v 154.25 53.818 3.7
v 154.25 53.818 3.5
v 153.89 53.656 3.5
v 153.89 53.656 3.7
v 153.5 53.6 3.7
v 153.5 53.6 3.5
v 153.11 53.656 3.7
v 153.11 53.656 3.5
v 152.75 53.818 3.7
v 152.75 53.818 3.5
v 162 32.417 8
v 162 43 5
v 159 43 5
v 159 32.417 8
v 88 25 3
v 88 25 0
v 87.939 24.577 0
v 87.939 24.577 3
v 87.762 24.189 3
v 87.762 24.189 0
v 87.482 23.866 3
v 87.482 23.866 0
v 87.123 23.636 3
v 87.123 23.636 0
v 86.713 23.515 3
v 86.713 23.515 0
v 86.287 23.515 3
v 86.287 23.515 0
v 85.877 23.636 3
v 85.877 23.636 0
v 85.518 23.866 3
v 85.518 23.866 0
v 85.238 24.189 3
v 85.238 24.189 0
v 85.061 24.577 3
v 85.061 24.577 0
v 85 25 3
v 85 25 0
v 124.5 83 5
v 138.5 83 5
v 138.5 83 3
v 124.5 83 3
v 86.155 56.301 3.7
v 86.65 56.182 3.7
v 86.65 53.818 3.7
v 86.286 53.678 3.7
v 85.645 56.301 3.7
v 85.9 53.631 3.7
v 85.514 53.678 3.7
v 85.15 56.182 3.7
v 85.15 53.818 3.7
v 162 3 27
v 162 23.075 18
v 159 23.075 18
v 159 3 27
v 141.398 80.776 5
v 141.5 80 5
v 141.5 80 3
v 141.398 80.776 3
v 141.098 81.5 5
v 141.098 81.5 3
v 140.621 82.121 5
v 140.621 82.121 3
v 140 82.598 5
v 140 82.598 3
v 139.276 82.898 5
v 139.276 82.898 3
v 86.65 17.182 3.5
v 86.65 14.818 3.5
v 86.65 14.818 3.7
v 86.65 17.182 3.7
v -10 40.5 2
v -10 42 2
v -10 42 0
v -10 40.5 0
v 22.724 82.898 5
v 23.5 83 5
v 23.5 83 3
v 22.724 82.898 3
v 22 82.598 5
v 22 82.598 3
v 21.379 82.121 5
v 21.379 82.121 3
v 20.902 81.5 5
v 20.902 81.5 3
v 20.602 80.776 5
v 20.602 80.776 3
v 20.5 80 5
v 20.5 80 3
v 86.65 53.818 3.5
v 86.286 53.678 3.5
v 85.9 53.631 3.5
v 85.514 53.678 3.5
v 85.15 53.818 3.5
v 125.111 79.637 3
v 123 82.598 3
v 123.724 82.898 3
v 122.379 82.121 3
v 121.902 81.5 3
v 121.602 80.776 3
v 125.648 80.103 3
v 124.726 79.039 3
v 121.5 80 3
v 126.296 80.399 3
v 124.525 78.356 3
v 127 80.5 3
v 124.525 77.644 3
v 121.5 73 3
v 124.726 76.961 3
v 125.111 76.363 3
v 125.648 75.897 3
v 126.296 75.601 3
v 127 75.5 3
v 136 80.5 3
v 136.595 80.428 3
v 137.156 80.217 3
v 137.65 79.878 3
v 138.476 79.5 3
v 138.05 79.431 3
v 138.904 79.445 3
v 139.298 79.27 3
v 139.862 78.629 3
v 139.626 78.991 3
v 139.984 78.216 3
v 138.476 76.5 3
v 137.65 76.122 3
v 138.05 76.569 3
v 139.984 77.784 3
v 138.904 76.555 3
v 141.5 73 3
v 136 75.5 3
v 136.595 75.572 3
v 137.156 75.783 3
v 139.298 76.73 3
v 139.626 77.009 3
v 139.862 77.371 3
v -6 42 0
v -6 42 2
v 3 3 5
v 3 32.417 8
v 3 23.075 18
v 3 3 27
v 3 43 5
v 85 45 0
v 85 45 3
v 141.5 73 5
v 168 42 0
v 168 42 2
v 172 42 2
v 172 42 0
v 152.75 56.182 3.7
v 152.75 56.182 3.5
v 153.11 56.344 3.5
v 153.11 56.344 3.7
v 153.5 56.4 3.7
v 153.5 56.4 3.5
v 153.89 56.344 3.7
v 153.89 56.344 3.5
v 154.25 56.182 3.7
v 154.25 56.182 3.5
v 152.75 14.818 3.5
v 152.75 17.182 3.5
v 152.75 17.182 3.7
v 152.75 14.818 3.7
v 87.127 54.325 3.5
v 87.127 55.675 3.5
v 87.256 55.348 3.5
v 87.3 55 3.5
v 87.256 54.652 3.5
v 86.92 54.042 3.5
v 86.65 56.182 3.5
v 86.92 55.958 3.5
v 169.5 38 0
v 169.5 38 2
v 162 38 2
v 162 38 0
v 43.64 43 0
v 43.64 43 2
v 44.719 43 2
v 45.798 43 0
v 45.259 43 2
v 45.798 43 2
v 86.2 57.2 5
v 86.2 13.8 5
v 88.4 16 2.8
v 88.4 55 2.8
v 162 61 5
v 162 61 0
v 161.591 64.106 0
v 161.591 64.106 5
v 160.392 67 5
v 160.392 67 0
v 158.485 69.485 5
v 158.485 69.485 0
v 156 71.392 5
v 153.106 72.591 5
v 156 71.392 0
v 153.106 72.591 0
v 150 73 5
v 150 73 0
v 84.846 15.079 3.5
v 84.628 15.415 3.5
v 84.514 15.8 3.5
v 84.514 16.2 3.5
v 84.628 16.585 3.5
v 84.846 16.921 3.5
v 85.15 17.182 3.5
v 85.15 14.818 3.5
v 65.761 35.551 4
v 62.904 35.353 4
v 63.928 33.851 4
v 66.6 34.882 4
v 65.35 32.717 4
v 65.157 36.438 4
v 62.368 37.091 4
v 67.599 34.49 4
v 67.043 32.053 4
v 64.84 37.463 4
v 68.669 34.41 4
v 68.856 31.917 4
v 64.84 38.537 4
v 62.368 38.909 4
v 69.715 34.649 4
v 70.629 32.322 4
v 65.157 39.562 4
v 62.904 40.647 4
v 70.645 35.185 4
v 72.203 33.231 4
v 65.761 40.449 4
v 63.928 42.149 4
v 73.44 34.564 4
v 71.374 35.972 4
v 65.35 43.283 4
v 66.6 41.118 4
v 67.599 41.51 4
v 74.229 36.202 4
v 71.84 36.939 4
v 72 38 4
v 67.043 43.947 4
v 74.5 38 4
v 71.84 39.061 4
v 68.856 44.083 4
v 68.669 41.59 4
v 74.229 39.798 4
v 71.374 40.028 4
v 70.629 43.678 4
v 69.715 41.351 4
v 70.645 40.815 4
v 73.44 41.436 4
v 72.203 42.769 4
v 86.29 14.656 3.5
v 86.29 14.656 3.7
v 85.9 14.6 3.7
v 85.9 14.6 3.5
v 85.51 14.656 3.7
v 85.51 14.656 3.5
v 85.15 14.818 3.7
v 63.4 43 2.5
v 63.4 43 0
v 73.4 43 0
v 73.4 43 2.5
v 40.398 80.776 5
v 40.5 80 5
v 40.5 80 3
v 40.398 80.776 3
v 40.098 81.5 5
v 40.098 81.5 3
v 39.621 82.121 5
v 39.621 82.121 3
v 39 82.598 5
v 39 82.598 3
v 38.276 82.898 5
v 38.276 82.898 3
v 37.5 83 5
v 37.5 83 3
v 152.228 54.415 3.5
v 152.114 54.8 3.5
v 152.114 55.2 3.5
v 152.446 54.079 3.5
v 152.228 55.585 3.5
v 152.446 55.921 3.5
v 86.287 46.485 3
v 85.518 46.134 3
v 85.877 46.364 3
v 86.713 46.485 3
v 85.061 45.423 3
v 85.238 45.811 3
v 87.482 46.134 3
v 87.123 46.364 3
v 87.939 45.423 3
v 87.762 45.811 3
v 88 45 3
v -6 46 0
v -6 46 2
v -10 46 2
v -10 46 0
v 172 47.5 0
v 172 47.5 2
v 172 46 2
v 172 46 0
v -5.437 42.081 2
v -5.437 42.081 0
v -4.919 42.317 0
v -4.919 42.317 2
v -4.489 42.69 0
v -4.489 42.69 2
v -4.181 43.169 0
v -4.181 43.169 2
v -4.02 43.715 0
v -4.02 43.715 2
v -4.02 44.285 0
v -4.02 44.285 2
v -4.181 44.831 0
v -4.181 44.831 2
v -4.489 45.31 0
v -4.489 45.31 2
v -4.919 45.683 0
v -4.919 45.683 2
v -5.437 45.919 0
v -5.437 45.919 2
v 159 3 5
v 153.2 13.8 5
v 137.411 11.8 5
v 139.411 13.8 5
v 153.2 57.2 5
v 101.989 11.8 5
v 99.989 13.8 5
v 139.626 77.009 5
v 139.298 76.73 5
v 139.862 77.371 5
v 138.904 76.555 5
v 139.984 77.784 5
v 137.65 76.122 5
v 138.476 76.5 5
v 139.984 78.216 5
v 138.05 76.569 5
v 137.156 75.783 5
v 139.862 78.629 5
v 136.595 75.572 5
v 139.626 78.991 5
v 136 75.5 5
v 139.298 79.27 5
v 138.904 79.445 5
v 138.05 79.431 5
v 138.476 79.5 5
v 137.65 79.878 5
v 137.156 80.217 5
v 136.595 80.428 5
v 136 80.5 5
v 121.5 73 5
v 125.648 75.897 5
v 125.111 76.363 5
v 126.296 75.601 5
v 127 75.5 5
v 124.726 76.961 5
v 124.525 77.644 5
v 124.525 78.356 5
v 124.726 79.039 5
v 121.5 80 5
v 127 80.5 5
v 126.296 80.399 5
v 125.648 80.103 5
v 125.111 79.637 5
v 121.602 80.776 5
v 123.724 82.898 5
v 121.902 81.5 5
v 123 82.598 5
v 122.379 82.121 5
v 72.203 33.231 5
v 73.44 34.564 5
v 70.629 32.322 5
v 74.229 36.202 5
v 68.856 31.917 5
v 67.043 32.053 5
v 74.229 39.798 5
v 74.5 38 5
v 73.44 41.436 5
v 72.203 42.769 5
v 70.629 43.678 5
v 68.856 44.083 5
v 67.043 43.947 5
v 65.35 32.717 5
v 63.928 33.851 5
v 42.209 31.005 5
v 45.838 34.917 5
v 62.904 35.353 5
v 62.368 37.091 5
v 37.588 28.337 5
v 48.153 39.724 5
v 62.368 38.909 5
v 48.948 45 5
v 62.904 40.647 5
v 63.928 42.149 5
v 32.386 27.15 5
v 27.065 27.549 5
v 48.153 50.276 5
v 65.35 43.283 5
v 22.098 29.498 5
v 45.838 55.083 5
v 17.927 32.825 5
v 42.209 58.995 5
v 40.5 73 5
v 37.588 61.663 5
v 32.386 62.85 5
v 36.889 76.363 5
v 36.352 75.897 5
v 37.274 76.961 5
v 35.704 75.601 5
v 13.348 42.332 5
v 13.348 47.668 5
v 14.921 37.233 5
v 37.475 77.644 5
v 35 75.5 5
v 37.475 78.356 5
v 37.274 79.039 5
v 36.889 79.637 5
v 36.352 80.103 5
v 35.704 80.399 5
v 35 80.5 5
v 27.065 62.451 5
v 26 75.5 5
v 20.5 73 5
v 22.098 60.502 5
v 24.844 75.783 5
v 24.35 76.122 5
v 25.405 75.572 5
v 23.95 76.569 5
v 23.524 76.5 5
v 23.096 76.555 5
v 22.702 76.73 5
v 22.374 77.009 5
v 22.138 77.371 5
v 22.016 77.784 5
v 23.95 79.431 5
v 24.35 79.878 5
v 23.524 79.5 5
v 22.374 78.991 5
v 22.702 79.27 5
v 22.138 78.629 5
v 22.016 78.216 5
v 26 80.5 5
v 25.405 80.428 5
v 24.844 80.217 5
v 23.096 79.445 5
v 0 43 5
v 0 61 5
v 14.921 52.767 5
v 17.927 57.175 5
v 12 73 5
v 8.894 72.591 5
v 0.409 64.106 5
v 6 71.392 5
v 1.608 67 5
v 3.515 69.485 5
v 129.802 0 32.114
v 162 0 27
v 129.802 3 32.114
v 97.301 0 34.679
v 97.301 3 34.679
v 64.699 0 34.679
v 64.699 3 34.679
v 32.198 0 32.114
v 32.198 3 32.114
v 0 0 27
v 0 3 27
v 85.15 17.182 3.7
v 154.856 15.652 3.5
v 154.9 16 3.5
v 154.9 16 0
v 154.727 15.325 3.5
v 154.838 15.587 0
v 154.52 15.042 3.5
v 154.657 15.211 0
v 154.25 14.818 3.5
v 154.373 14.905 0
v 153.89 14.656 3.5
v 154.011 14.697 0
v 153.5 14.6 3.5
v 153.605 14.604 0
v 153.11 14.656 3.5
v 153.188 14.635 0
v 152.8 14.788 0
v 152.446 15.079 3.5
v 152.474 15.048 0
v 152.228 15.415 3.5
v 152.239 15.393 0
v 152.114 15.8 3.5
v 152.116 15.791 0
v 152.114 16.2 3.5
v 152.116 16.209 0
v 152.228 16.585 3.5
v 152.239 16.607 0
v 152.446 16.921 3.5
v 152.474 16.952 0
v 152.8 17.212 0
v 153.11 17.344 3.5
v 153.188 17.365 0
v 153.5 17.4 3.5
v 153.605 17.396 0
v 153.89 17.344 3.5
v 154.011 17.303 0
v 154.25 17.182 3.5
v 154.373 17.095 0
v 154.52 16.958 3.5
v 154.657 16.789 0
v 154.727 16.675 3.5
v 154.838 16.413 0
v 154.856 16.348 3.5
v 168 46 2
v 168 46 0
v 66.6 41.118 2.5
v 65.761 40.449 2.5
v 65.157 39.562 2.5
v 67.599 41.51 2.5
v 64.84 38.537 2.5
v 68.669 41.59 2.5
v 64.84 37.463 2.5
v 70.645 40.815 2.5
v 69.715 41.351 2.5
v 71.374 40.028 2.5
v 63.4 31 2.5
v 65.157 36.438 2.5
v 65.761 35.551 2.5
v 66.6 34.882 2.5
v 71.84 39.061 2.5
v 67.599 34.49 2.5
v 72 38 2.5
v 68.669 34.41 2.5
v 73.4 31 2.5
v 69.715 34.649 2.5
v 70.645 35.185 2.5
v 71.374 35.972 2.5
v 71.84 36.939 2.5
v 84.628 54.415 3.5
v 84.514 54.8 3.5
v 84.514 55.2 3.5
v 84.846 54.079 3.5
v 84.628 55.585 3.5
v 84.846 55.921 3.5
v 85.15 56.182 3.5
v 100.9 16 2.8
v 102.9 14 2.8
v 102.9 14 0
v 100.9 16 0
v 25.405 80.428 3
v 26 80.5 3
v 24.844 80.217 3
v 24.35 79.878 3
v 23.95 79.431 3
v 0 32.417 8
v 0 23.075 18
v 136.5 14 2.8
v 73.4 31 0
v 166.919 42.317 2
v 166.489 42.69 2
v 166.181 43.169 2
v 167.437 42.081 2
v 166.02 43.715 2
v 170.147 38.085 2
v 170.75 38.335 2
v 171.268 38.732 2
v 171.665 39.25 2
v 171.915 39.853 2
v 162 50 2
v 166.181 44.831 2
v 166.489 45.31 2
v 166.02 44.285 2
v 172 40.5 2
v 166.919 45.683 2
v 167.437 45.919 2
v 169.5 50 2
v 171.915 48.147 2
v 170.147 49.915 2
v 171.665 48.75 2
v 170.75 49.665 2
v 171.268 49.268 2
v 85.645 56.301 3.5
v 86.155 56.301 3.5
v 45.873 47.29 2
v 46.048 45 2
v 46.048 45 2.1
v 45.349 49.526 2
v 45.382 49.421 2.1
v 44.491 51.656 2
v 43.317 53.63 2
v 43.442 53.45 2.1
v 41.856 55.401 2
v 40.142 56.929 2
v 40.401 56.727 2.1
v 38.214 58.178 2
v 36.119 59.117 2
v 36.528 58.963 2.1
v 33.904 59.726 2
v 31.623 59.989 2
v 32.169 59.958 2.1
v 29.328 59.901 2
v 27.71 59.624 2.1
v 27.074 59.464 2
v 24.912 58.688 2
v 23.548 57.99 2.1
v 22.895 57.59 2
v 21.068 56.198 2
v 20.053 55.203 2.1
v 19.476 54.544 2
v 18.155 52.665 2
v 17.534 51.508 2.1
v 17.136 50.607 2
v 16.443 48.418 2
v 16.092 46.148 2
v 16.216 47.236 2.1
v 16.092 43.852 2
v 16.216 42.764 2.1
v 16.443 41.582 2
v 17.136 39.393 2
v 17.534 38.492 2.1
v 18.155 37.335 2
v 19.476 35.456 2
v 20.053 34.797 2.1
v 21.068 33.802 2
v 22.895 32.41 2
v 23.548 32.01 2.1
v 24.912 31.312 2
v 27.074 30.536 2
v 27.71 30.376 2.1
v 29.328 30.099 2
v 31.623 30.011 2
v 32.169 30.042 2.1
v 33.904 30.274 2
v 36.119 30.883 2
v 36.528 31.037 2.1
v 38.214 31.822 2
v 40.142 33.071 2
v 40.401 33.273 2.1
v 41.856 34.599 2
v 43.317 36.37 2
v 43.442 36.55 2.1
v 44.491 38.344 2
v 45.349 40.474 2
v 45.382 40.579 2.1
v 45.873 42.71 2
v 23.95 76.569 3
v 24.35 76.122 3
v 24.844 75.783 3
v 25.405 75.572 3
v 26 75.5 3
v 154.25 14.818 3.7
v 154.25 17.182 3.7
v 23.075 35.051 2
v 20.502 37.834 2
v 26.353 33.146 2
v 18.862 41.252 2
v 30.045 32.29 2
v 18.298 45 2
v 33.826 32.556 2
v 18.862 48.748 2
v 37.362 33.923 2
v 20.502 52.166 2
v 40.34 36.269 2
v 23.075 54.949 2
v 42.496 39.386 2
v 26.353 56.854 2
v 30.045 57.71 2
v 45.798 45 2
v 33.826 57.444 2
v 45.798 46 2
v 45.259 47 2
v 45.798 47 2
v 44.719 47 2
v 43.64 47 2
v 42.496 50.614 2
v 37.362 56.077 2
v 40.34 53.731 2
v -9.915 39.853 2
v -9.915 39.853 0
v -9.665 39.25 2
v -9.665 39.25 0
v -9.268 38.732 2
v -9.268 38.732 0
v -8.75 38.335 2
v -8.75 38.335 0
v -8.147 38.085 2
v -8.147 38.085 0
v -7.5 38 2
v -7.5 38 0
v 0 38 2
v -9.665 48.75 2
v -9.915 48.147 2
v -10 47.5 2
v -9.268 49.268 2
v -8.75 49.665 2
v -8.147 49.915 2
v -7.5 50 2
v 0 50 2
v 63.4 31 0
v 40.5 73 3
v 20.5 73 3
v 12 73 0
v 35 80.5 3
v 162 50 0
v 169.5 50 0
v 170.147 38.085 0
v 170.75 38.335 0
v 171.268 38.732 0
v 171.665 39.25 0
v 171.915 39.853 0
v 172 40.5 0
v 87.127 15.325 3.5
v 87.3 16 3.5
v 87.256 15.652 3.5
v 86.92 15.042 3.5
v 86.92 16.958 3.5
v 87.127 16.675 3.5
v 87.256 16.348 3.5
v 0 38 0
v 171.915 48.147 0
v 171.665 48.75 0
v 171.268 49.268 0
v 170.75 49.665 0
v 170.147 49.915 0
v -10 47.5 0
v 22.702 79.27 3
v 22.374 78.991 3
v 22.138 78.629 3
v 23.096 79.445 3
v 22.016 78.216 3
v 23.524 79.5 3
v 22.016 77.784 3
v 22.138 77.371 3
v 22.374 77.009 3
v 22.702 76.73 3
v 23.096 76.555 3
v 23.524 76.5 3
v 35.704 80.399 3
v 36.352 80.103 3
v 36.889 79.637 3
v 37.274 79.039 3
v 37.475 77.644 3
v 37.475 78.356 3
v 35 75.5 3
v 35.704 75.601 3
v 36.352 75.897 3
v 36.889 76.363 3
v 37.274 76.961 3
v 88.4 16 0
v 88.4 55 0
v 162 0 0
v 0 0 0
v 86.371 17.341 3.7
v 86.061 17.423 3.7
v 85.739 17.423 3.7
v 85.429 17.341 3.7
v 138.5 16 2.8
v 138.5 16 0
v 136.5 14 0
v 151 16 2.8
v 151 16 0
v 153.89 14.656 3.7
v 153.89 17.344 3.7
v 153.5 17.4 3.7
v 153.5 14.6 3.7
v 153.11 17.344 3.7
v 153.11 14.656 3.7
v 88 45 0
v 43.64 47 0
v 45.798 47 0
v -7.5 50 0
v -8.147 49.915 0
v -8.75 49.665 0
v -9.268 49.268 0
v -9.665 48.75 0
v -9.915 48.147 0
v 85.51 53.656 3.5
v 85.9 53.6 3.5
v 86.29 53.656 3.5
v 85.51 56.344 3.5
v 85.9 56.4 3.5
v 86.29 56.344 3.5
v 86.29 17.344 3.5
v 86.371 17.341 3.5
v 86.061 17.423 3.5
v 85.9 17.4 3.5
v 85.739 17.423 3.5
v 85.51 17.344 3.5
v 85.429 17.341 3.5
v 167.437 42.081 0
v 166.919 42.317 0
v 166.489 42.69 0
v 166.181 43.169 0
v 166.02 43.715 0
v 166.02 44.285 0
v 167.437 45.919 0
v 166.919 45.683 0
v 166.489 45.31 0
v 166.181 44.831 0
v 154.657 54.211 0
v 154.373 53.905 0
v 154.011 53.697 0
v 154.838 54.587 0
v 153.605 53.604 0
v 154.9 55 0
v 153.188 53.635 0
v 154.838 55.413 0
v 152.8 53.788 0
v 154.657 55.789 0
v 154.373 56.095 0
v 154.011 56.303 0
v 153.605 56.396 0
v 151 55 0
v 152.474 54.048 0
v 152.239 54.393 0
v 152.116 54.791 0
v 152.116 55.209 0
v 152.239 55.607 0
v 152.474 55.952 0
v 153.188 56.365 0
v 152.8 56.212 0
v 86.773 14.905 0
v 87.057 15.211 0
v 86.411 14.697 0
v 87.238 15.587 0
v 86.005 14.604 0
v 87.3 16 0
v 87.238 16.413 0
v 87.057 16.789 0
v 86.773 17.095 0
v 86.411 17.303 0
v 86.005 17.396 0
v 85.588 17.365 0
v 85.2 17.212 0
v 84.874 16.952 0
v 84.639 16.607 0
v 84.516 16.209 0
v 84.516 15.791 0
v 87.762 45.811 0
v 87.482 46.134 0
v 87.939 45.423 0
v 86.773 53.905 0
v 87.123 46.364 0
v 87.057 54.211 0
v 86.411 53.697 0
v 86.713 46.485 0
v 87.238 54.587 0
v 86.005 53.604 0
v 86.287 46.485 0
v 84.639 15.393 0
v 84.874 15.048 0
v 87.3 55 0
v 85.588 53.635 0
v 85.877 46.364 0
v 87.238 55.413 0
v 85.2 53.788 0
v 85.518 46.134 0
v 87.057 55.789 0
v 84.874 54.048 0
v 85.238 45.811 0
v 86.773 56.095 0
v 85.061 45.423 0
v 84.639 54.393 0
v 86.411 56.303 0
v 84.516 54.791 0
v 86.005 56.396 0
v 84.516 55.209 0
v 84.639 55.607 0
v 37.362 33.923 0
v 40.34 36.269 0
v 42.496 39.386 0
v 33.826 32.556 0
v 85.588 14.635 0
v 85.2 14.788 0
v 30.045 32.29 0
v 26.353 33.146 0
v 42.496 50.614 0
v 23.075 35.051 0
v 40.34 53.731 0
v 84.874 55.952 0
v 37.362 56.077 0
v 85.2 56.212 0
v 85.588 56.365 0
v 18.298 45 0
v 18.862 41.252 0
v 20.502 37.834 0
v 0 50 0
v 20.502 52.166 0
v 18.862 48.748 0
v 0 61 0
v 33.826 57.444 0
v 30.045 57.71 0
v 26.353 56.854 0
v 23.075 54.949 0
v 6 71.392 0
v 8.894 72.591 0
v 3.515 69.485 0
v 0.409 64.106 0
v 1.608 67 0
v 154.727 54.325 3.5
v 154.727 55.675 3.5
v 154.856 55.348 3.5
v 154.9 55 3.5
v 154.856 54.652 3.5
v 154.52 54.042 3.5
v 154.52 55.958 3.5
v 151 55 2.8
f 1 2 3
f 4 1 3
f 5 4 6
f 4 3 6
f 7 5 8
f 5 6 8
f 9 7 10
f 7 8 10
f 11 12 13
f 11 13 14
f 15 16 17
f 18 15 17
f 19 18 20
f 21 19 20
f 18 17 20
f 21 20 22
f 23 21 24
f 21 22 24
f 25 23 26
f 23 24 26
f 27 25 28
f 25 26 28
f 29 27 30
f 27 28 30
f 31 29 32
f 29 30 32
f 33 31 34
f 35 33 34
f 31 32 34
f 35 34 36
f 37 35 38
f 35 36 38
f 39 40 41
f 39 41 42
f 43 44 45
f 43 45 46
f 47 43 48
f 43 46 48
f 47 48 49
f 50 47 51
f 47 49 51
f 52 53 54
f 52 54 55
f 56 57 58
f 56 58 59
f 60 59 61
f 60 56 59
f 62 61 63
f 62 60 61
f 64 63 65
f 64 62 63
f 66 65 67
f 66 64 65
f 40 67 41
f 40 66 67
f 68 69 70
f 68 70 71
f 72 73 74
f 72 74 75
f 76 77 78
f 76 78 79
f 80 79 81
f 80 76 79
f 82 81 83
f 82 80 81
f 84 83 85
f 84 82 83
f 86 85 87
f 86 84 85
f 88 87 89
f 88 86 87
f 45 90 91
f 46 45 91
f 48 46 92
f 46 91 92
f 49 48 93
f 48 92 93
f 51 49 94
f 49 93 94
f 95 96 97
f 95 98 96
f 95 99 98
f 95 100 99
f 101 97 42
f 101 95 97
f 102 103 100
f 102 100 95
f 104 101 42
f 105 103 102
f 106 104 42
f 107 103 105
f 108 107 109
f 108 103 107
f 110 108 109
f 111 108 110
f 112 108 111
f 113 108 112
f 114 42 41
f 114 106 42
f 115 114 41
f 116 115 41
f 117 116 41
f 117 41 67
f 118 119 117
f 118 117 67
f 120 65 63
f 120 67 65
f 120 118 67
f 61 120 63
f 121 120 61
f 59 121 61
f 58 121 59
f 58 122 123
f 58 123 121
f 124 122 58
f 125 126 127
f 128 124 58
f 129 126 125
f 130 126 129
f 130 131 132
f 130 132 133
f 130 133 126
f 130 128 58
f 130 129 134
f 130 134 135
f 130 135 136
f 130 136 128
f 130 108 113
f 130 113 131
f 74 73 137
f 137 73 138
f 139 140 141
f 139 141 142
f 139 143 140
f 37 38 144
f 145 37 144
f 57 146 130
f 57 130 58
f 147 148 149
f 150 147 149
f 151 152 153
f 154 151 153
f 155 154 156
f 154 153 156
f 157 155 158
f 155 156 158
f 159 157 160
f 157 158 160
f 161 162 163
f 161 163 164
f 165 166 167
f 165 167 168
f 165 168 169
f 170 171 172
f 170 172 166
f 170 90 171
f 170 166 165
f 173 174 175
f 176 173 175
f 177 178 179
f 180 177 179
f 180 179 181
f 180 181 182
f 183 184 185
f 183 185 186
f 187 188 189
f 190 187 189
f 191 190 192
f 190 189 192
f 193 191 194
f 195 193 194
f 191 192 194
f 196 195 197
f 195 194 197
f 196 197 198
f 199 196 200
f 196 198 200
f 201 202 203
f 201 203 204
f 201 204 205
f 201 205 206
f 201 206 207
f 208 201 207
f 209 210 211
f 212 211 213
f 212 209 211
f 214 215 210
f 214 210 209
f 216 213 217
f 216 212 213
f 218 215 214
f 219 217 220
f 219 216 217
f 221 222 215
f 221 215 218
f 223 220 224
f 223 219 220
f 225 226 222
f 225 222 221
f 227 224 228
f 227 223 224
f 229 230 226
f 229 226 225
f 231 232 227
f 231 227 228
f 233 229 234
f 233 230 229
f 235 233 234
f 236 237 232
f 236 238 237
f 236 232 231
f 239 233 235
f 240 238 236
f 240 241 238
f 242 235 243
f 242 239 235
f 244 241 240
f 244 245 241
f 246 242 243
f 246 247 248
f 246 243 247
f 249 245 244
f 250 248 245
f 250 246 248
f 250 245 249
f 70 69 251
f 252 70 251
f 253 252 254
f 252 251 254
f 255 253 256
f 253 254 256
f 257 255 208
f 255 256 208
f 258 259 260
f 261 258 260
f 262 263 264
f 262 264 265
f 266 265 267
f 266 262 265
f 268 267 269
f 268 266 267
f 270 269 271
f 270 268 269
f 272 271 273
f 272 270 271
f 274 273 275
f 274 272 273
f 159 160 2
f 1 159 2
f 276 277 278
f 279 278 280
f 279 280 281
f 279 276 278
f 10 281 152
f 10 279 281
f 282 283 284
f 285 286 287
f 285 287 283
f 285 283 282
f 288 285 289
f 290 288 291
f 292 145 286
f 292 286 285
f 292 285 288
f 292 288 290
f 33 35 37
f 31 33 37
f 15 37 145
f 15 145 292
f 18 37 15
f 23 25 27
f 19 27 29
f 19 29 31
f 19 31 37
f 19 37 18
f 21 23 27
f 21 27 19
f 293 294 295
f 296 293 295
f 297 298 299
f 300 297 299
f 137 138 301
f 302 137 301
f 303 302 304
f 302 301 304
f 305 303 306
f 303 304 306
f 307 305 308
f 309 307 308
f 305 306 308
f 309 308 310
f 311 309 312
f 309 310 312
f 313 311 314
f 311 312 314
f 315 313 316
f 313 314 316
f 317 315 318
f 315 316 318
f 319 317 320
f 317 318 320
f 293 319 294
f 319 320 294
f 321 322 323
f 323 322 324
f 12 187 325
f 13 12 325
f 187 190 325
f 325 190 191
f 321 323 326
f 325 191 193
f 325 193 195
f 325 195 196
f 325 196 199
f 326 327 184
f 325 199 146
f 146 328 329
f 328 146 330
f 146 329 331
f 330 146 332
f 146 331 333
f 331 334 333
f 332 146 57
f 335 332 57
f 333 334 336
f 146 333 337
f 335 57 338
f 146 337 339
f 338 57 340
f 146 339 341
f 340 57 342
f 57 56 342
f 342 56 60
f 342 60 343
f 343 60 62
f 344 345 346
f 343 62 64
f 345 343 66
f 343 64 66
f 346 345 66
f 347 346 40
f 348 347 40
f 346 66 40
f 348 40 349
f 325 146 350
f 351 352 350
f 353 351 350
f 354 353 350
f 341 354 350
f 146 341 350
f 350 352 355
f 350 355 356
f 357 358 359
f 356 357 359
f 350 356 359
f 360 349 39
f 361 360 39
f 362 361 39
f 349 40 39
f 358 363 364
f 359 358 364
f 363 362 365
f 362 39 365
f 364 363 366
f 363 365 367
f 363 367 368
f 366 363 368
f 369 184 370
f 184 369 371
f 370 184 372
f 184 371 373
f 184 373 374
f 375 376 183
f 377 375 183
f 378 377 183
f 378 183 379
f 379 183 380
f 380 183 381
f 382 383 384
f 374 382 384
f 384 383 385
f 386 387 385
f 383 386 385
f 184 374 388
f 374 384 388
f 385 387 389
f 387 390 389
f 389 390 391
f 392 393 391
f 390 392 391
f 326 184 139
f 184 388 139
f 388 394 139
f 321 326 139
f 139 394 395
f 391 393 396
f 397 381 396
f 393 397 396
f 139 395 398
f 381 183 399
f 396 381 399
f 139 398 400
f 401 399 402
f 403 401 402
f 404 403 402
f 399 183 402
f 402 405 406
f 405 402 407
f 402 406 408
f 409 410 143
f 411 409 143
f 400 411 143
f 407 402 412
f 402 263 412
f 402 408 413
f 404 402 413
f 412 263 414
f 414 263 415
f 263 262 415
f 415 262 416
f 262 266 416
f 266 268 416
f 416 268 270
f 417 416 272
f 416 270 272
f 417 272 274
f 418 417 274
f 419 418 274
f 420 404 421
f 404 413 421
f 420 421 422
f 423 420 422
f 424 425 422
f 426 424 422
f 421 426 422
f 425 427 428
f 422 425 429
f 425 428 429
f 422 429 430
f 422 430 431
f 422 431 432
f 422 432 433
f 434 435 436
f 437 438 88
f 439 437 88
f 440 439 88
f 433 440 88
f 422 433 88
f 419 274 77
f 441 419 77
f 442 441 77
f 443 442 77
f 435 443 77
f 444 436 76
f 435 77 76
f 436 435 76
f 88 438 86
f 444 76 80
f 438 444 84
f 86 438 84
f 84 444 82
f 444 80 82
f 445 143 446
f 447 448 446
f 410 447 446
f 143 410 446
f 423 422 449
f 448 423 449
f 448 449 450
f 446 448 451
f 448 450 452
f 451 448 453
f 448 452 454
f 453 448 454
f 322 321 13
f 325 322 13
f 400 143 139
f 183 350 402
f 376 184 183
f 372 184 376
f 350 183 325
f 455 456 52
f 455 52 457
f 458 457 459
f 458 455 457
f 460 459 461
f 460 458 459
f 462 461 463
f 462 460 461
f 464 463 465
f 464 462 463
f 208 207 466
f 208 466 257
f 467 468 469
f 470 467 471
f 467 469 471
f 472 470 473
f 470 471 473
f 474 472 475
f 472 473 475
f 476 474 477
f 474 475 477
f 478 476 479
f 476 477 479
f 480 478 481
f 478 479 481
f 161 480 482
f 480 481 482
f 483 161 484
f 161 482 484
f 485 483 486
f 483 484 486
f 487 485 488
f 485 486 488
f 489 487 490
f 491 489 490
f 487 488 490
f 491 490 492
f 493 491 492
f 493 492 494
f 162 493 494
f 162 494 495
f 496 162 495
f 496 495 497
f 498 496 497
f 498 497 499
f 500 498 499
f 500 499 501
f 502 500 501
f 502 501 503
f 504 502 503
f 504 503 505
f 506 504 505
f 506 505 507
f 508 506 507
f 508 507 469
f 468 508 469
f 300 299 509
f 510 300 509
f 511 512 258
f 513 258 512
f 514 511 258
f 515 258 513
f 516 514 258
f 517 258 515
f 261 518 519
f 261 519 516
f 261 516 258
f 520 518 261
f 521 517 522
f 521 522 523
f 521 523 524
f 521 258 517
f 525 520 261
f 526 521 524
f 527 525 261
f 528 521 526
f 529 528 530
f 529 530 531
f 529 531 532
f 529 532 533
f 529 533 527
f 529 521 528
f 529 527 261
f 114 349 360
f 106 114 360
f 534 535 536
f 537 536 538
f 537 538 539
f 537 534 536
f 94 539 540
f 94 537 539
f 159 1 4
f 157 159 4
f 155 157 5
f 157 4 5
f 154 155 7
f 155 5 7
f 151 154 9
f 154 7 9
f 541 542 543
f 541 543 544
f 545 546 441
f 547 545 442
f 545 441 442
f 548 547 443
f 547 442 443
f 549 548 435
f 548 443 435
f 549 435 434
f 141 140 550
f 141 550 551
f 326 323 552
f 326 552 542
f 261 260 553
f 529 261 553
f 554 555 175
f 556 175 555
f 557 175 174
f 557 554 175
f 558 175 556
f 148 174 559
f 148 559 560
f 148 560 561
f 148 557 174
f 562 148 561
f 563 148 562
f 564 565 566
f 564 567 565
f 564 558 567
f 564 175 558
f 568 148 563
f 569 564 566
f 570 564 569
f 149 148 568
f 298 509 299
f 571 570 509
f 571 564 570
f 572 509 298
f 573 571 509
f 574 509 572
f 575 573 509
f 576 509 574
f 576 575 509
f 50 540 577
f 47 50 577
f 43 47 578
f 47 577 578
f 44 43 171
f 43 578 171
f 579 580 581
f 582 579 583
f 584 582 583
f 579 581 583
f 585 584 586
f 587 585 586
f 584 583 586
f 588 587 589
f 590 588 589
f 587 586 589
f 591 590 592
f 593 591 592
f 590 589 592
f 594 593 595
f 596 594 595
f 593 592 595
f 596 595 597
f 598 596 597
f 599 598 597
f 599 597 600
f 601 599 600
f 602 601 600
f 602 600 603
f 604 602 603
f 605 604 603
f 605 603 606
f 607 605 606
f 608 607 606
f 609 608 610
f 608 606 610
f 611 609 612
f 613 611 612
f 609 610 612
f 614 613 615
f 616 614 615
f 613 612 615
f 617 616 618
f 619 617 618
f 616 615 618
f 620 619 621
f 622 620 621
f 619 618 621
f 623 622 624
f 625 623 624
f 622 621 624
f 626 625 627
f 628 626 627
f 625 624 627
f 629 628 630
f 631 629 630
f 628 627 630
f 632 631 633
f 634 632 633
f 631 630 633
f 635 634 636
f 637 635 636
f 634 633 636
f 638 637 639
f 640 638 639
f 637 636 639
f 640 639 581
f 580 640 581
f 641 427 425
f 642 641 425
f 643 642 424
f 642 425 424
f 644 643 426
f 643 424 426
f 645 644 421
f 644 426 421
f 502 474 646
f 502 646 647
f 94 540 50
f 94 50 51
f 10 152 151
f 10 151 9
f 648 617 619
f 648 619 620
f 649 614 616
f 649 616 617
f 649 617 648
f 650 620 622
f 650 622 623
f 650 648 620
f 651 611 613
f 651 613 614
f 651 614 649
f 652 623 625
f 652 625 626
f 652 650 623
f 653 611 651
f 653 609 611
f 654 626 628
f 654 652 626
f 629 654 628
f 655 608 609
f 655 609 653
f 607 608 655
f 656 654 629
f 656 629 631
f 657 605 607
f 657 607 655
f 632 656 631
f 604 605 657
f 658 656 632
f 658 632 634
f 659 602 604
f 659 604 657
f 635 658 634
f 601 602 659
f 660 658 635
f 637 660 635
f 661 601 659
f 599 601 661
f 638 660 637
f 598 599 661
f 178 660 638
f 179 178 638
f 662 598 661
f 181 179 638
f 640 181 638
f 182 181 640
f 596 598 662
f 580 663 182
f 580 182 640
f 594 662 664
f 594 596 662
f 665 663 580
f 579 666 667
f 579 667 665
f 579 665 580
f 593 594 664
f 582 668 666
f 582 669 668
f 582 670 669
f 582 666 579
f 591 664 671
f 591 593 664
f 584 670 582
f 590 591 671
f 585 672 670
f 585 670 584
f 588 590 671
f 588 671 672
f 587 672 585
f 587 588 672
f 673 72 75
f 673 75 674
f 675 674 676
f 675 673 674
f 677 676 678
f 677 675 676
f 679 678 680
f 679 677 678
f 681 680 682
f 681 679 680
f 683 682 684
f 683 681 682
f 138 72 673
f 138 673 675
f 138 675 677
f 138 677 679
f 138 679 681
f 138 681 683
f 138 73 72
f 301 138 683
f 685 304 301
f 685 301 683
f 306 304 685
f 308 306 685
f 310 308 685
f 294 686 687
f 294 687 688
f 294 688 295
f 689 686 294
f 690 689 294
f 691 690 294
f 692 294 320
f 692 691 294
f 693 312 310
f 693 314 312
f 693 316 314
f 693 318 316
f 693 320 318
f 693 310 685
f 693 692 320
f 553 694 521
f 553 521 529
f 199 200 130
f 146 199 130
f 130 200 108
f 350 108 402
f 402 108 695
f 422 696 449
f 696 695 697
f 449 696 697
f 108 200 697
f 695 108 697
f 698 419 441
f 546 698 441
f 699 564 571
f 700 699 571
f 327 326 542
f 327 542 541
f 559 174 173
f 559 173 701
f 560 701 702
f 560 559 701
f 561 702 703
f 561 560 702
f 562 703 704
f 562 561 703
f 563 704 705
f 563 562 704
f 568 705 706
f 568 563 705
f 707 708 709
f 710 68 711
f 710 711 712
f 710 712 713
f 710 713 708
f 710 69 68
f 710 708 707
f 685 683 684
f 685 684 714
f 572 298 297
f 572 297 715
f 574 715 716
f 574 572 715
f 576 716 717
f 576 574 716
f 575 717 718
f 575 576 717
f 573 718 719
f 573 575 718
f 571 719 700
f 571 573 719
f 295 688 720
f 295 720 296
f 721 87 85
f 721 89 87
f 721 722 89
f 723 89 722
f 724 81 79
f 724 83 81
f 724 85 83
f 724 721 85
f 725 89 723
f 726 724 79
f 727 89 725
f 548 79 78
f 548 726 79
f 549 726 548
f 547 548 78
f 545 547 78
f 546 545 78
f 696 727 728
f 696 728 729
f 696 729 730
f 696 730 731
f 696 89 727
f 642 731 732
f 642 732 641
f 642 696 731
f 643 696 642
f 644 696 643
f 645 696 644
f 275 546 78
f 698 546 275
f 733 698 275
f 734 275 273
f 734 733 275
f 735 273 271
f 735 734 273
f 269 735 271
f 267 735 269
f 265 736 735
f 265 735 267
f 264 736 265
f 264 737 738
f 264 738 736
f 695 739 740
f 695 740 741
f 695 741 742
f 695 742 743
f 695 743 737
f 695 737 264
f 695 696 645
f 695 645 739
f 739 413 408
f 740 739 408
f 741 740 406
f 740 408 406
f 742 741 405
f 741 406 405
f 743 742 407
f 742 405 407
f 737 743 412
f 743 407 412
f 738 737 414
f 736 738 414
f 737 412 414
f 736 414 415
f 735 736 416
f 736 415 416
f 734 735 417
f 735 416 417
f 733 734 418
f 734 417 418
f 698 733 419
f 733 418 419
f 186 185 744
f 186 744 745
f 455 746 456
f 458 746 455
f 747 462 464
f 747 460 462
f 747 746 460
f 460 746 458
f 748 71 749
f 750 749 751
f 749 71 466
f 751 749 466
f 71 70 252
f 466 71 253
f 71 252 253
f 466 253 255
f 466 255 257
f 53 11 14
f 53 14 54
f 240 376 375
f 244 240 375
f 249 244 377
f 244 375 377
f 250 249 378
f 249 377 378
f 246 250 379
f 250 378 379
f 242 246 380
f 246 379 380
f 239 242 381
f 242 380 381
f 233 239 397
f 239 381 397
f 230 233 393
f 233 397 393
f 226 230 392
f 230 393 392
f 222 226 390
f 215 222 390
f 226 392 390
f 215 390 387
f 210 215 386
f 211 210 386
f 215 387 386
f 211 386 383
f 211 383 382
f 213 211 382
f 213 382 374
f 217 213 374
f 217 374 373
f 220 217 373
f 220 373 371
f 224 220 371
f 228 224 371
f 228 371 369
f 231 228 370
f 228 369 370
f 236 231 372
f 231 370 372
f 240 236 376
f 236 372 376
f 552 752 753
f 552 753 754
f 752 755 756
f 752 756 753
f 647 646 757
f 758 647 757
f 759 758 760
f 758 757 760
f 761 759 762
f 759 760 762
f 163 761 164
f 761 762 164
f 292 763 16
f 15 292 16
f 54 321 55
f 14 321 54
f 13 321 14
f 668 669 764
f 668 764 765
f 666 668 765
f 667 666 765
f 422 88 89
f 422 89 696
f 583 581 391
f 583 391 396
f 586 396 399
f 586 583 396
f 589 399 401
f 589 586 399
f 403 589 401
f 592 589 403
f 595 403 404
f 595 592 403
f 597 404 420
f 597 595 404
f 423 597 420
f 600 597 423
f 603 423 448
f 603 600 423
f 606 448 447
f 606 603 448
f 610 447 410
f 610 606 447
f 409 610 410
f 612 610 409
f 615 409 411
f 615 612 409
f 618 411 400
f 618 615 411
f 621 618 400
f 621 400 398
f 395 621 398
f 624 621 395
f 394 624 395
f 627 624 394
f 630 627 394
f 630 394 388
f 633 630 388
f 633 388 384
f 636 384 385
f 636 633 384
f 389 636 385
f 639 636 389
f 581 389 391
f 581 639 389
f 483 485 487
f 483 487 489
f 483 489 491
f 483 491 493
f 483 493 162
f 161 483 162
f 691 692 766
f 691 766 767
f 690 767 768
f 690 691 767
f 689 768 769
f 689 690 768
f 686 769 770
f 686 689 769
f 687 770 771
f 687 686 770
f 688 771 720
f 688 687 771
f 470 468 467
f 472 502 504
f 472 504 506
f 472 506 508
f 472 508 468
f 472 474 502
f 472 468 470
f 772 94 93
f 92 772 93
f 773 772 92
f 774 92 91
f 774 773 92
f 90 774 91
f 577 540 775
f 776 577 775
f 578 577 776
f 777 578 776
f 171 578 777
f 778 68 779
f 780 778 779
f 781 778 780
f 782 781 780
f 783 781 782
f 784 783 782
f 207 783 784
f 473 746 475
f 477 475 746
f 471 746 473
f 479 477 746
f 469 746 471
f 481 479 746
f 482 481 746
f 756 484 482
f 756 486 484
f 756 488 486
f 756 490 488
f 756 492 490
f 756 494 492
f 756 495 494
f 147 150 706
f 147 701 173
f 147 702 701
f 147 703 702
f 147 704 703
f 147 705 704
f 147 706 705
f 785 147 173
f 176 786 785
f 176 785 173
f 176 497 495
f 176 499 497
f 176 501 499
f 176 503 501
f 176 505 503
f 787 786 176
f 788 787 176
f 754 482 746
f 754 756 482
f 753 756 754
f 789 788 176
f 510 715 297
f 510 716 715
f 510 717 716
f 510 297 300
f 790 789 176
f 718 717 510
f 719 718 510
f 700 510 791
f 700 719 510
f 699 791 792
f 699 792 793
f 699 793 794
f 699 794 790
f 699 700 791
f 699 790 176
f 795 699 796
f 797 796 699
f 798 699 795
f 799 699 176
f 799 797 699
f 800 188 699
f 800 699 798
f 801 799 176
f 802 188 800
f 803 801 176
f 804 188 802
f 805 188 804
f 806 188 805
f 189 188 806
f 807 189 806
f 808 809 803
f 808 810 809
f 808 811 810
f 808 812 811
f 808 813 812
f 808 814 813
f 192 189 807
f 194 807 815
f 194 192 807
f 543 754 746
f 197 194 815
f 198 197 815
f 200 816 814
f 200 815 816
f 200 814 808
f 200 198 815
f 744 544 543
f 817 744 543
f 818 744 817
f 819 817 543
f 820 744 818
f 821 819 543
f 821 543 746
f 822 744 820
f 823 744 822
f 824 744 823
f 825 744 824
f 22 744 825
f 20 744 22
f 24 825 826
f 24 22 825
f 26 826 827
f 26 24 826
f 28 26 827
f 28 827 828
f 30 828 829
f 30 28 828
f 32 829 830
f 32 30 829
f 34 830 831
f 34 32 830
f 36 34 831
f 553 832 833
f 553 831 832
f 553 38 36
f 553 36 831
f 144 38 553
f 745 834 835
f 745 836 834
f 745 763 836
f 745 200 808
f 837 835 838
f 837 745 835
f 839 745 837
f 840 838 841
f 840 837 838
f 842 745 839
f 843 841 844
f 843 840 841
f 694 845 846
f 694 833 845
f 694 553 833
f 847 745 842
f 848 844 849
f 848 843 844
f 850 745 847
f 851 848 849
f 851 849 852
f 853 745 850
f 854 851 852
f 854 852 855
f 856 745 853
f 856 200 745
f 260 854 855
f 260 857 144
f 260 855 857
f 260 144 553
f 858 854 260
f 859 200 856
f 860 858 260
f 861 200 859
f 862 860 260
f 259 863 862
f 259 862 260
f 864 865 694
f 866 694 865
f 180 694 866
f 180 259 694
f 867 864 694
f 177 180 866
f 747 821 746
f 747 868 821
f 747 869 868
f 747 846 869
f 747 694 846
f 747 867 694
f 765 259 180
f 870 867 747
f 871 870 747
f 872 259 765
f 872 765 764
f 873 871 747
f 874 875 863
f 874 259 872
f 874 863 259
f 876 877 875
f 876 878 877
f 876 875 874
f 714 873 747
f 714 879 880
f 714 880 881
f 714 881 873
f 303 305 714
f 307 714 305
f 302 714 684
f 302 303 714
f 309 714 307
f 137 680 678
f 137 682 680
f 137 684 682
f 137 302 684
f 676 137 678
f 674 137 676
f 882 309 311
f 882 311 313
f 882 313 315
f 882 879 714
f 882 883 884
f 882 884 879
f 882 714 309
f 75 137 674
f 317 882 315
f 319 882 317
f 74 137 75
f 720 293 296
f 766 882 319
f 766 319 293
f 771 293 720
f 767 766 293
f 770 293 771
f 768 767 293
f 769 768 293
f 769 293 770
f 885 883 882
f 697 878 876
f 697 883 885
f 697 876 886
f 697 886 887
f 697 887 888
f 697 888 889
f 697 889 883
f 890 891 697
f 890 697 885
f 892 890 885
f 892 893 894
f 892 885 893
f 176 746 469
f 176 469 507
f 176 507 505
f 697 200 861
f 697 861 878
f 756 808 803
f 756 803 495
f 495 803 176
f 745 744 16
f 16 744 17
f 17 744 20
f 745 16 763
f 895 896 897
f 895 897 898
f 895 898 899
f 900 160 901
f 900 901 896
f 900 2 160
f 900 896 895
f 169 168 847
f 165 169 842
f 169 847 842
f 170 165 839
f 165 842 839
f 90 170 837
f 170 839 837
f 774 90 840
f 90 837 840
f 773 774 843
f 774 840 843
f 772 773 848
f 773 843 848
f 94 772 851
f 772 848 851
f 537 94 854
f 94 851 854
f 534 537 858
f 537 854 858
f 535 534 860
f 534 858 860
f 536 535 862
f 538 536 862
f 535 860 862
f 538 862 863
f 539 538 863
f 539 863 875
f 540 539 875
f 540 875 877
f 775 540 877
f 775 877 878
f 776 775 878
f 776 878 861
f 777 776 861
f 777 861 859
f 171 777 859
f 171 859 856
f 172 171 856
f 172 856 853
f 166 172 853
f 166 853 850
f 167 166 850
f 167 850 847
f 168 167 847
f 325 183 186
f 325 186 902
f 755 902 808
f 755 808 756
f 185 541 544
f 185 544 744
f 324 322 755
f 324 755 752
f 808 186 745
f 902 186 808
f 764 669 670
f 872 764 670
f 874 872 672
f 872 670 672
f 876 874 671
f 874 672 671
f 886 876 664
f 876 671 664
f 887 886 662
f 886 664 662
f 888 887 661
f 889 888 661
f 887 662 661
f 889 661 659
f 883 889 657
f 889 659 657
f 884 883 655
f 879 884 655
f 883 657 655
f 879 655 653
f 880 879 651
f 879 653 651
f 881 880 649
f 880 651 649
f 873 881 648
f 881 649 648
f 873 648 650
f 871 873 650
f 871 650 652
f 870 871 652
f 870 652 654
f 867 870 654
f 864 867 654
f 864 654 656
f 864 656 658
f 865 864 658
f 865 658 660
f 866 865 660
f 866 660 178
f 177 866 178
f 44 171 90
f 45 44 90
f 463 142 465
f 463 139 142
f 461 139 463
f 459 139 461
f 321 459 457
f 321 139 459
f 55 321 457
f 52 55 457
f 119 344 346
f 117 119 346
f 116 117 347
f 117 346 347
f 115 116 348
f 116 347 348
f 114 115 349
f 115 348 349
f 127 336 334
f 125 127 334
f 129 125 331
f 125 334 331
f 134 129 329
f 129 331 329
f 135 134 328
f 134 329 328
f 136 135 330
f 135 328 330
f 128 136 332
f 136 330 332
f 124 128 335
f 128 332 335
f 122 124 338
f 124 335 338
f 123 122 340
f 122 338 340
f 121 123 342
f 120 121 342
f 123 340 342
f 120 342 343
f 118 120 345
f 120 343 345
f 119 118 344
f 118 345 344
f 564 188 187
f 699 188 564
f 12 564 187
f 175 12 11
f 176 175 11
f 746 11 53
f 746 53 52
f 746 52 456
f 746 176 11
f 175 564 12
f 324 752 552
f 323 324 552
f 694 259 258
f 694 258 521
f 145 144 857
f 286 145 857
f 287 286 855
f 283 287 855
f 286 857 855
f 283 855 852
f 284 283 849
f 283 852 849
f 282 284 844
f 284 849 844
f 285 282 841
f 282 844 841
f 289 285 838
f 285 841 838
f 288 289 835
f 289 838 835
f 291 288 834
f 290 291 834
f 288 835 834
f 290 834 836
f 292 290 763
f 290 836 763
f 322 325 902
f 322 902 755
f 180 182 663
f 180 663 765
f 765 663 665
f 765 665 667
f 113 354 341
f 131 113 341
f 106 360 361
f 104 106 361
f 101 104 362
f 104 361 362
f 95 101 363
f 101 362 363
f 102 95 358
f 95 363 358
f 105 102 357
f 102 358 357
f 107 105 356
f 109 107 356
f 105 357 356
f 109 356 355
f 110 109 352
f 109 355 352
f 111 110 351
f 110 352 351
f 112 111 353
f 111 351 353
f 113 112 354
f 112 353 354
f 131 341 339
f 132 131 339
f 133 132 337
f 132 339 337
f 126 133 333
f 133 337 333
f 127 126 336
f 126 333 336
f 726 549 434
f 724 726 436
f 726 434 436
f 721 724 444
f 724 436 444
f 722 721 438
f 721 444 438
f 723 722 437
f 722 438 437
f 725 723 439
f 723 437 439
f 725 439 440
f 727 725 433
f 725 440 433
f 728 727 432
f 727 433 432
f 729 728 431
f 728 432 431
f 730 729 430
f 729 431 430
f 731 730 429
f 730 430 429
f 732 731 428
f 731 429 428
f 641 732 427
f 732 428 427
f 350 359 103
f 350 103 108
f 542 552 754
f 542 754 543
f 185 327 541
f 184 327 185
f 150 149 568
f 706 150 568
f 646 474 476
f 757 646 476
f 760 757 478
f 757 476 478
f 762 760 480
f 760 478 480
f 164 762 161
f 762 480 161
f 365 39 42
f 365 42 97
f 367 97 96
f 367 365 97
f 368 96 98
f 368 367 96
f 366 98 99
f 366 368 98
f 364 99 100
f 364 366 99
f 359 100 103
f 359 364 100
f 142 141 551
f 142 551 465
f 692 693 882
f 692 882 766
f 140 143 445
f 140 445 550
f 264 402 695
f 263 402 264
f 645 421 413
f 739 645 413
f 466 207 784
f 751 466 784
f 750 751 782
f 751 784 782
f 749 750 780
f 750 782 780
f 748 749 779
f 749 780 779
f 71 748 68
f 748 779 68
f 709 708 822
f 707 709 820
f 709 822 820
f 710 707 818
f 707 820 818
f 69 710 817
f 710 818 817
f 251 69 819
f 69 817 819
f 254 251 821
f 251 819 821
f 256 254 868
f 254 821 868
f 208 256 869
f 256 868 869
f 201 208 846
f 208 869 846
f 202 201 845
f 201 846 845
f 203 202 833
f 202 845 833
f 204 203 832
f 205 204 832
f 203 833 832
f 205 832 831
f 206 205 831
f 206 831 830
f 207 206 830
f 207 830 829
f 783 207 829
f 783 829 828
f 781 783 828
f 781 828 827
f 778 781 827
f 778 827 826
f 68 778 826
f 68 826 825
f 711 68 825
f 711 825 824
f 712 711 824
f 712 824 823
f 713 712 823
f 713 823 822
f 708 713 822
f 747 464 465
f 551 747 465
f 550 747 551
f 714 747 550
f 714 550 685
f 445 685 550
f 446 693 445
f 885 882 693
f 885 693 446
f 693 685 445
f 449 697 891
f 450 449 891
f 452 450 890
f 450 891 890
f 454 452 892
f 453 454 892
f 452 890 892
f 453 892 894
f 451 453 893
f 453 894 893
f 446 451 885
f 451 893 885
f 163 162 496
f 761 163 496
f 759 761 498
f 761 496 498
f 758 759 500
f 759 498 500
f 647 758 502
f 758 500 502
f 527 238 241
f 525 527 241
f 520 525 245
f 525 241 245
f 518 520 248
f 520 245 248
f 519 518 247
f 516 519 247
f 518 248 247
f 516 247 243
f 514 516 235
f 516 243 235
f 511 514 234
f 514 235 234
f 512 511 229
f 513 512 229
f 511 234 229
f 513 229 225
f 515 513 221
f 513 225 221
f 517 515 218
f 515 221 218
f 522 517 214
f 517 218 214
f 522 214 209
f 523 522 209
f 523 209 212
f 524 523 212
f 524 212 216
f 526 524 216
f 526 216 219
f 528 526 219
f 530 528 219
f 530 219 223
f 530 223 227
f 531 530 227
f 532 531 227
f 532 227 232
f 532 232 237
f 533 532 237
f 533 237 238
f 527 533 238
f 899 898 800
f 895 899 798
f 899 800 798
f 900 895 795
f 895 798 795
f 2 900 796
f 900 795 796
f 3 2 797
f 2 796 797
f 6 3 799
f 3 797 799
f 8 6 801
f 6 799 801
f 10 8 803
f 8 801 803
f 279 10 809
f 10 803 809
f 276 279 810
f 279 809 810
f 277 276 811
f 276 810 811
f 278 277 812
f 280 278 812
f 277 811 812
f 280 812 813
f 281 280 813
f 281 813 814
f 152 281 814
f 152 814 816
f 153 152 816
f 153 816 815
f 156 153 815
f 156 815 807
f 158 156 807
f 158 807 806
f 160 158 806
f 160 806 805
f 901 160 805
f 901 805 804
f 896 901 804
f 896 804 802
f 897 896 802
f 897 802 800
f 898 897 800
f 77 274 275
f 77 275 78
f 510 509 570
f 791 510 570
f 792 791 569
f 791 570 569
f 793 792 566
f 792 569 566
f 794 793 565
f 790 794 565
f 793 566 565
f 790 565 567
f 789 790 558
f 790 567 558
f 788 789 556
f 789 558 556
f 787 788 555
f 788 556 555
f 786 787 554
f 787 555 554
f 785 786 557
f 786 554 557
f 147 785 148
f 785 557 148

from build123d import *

# Parameters (mm, degrees)
PAD_DEPTH       = 5
PAD001_DEPTH    = 30
POCKET_DEPTH    = 162.001
POCKET001_DEPTH = 5
PAD002_DEPTH    = 5
POCKET002_DEPTH = 5.001
SKETCH007_W     = 22.303925
SKETCH007_H     = 15.153027
SKETCH007_W_2   = 15.272888
SKETCH007_H_2   = 13.786167
POCKET003_DEPTH = 3
SKETCH008_W     = 25.606406
SKETCH008_H     = 16.851532
SKETCH008_W_2   = 36.655319
SKETCH008_H_2   = 18.371552
POCKET004_DEPTH = 3
SKETCH009_R     = 1.5
POCKET005_DEPTH = 5
SKETCH010_R     = 3.6
SKETCH010_R_2   = 12.75
POCKET006_DEPTH = 5.001
SKETCH011_W     = 5.6250572961
SKETCH011_H     = 4
POCKET007_DEPTH = 5.001
SKETCH012_R     = 15
POCKET008_DEPTH = 3
SKETCH013_R     = 6.1
POCKET009_DEPTH = 1
SKETCH_R        = 1.4
POCKET010_DEPTH = 3.5
POCKET011_DEPTH = 0.2
SKETCH016_W     = 10
SKETCH016_H     = 12
POCKET013_DEPTH = 2.5
SKETCH018_W     = 7.2
SKETCH018_H     = 7.2
POCKET015_DEPTH = 0.2
POCKET016_DEPTH = 3
CHAMFER_SIZE    = 2.2
CHAMFER001_SIZE = 2.9


with BuildPart() as part:
    # Sketch001 → Pad (new body)
    with BuildSketch(Plane.XY):
        with BuildLine():
            Line((0, 0), (162, 0))
            Line((162, 0), (162, 61))
            ThreePointArc((162, 61), (158.4852813742, 69.4852813742), (150, 73))
            Line((150, 73), (12, 73))
            ThreePointArc((12, 73), (3.5147186258, 69.4852813742), (0, 61))
            Line((0, 61), (0, 0))
        make_face()
    extrude(amount=PAD_DEPTH)

    # Sketch002 (on Face8 of Pad) → Pad001 (join)
    with BuildSketch(Plane.XY.offset(5)):
        Polygon((0, 0), (0, 43), (3, 43), (3, 3), (159, 3), (159, 43), (162, 43), (162, 0), align=None)
    extrude(amount=PAD001_DEPTH)

    # Sketch003 (on Face10 of Pad001) → Pocket (cut, through all)
    with BuildSketch(Plane.YZ.offset(162)):
        Polygon((43, 5), (32.4169947557, 8), (23.0748598999, 18), (3, 27), (3, 35), (43, 35), align=None)
    extrude(amount=-POCKET_DEPTH, mode=Mode.SUBTRACT)

    # Sketch004 (on Face5 of Pocket) → Pocket001 (cut)
    with BuildSketch(Plane.XZ):
        with BuildLine():
            Line((0, 27), (0, 61.0433678259))
            Line((0, 61.0433678259), (162, 61.0433678259))
            Line((162, 61.0433678259), (162, 27))
            ThreePointArc((162, 27), (81, 35), (0, 27))
        make_face()
    extrude(amount=-POCKET001_DEPTH, mode=Mode.SUBTRACT)

    # Sketch005 (on Face7 of Pocket001) → Pad002 (join)
    with BuildSketch(Plane.XY.offset(5)):
        with BuildLine():
            Line((162, 50), (169.5, 50))
            ThreePointArc((172, 47.5), (171.267766953, 49.267766953), (169.5, 50))
            Line((172, 47.5), (172, 40.5))
            ThreePointArc((169.5, 38), (171.267766953, 38.732233047), (172, 40.5))
            Line((169.5, 38), (162, 38))
            Line((162, 38), (162, 50))
        make_face()
        with BuildLine():
            Line((0, 50), (-7.5, 50))
            ThreePointArc((-7.5, 50), (-9.267766953, 49.267766953), (-10, 47.5))
            Line((-10, 47.5), (-10, 40.5))
            ThreePointArc((-10, 40.5), (-9.267766953, 38.732233047), (-7.5, 38))
            Line((-7.5, 38), (0, 38))
            Line((0, 38), (0, 50))
        make_face()
        with BuildLine():
            Line((20.5, 73), (40.5, 73))
            Line((40.5, 73), (40.5, 80))
            ThreePointArc((40.5, 80), (39.6213203436, 82.1213203436), (37.5, 83))
            Line((37.5, 83), (23.5, 83))
            ThreePointArc((23.5, 83), (21.3786796564, 82.1213203436), (20.5, 80))
            Line((20.5, 80), (20.5, 73))
        make_face()
        with BuildLine():
            Line((121.5, 73), (141.5, 73))
            Line((141.5, 73), (141.5, 80))
            ThreePointArc((141.5, 80), (140.6213203436, 82.1213203436), (138.5, 83))
            Line((138.5, 83), (124.5, 83))
            ThreePointArc((124.5, 83), (122.3786796564, 82.1213203436), (121.5, 80))
            Line((121.5, 80), (121.5, 73))
        make_face()
    extrude(amount=-PAD002_DEPTH)

    # Sketch006 (on Face56 of Pad002) → Pocket002 (cut, through all)
    with BuildSketch(Plane.XY.offset(5)):
        with BuildLine():
            ThreePointArc((26, 80.5), (23.5, 78), (26, 75.5))
            Line((26, 75.5), (35, 75.5))
            ThreePointArc((35, 75.5), (37.5, 78), (35, 80.5))
            Line((35, 80.5), (26, 80.5))
        make_face()
        with BuildLine():
            ThreePointArc((127, 80.5), (124.5, 78), (127, 75.5))
            Line((127, 75.5), (136, 75.5))
            ThreePointArc((136, 75.5), (138.5, 78), (136, 80.5))
            Line((136, 80.5), (127, 80.5))
        make_face()
        with BuildLine():
            ThreePointArc((-15.2672618866, 46), (-17.2672618866, 44), (-15.2672618866, 42))
            Line((-15.2672618866, 42), (-6, 42))
            ThreePointArc((-6, 42), (-4, 44), (-6, 46))
            Line((-6, 46), (-15.2672618866, 46))
        make_face()
        with BuildLine():
            ThreePointArc((180.8359560682, 42), (182.8359560682, 44), (180.8359560682, 46))
            Line((180.8359560682, 46), (168, 46))
            ThreePointArc((168, 46), (166, 44), (168, 42))
            Line((168, 42), (180.8359560682, 42))
        make_face()
    extrude(amount=-POCKET002_DEPTH, mode=Mode.SUBTRACT)

    # Sketch007 (on Face29 of Pocket002) → Pocket003 (cut)
    with BuildSketch(Plane.XY.offset(5)):
        with Locations((-11.1519625, 45.5765135)):
            Rectangle(SKETCH007_W, SKETCH007_H)
        with Locations((169.636444, 43.1069165)):
            Rectangle(SKETCH007_W_2, SKETCH007_H_2)
    extrude(amount=-POCKET003_DEPTH, mode=Mode.SUBTRACT)

    # Sketch008 (on Face4 of Pocket003) → Pocket004 (cut)
    with BuildSketch(Plane(origin=(0, 0, 0), x_dir=(1, 0, 0), z_dir=(0, 0, -1))):
        with Locations((27.696797, -81.425766)):
            Rectangle(SKETCH008_W, SKETCH008_H)
        with Locations((139.8276595, -82.185776)):
            Rectangle(SKETCH008_W_2, SKETCH008_H_2)
    extrude(amount=-POCKET004_DEPTH, mode=Mode.SUBTRACT)

    # Sketch009 (on Face29 of Pocket004) → Pocket005 (cut)
    with BuildSketch(Plane.XY.offset(5)):
        with Locations((138.5, 78)):
            Circle(SKETCH009_R)
        with Locations((23.5, 78)):
            Circle(SKETCH009_R)
    extrude(amount=-POCKET005_DEPTH, mode=Mode.SUBTRACT)

    # Sketch010 (on Face65 of Pocket005) → Pocket006 (cut, through all)
    with BuildSketch(Plane.XY.offset(5)):
        with Locations((68.4, 38)):
            Circle(SKETCH010_R)
        with Locations((31.0483132961, 45)):
            Circle(SKETCH010_R_2)
        Polygon((88.4, 55), (151, 55), (151, 16), (138.5, 16), (136.5000000003, 14), (102.9, 14), (100.9, 16), (88.4, 16), align=None)
    extrude(amount=-POCKET006_DEPTH, mode=Mode.SUBTRACT)

    # Sketch011 (on Face69 of Pocket006) → Pocket007 (cut, through all)
    with BuildSketch(Plane.XY.offset(5)):
        with Locations((42.985784648, 45)):
            Rectangle(SKETCH011_W, SKETCH011_H)
    extrude(amount=-POCKET007_DEPTH, mode=Mode.SUBTRACT)

    # Sketch012 (on Face42 of Pocket007) → Pocket008 (cut)
    with BuildSketch(Plane.XY.offset(5)):
        with Locations((31.0483132961, 45)):
            Circle(SKETCH012_R)
    extrude(amount=-POCKET008_DEPTH, mode=Mode.SUBTRACT)

    # Sketch013 (on Face72 of Pocket008) → Pocket009 (cut)
    with BuildSketch(Plane.XY.offset(5)):
        with Locations((68.4, 38)):
            Circle(SKETCH013_R)
    extrude(amount=-POCKET009_DEPTH, mode=Mode.SUBTRACT)

    # Sketch (on Face4 of Pocket009) → Pocket010 (cut)
    with BuildSketch(Plane(origin=(0, 0, 0), x_dir=(1, 0, 0), z_dir=(0, 0, -1))):
        with Locations((85.9, -16)):
            Circle(SKETCH_R)
        with Locations((153.5, -16)):
            Circle(SKETCH_R)
        with Locations((85.9, -55)):
            Circle(SKETCH_R)
        with Locations((153.5, -55)):
            Circle(SKETCH_R)
    extrude(amount=-POCKET010_DEPTH, mode=Mode.SUBTRACT)

    # Sketch014 (on Face81 of Pocket010) → Pocket011 (cut)
    with BuildSketch(Plane(origin=(0, 0, 3.5), x_dir=(1, 0, 0), z_dir=(0, 0, -1))):
        with BuildLine():
            Line((85.15, -56.1821590418), (85.15, -53.8178409582))
            ThreePointArc((86.65, -53.8178409582), (85.9, -53.6310250587), (85.15, -53.8178409582))
            Line((86.65, -56.1821590418), (86.65, -53.8178409582))
            ThreePointArc((85.15, -56.1821590418), (85.9, -56.3158445643), (86.65, -56.1821590418))
        make_face()
        with BuildLine():
            Line((152.75, -17.1821590418), (152.75, -14.8178409582))
            ThreePointArc((154.25, -14.8178409582), (153.5, -14.6), (152.75, -14.8178409582))
            Line((154.25, -14.8178409582), (154.25, -17.1821590418))
            ThreePointArc((152.75, -17.1821590418), (153.5, -17.4), (154.25, -17.1821590418))
        make_face()
        with BuildLine():
            Line((152.75, -56.1821590418), (152.75, -53.8178409582))
            ThreePointArc((154.25, -53.8178409582), (153.5, -53.6), (152.75, -53.8178409582))
            Line((154.25, -56.1821590418), (154.25, -53.8178409582))
            ThreePointArc((152.75, -56.1821590418), (153.5, -56.4), (154.25, -56.1821590418))
        make_face()
        with BuildLine():
            Line((85.15, -17.1821590418), (85.15, -14.8178409582))
            ThreePointArc((86.65, -14.8178409582), (85.9, -14.6), (85.15, -14.8178409582))
            Line((86.65, -14.8178409582), (86.65, -17.1821590418))
            ThreePointArc((85.15, -17.1821590418), (85.9, -17.4337278664), (86.65, -17.1821590418))
        make_face()
    extrude(amount=-POCKET011_DEPTH, mode=Mode.SUBTRACT)

    # Sketch016 → Pocket013 (cut)
    with BuildSketch(Plane(origin=(0, 0, 0), x_dir=(1, 0, 0), z_dir=(0, 0, -1))):
        with Locations((68.4, -37)):
            Rectangle(SKETCH016_W, SKETCH016_H)
    extrude(amount=-POCKET013_DEPTH, mode=Mode.SUBTRACT)

    # Sketch018 → Pocket015 (cut)
    with BuildSketch(Plane.XZ.offset(-55.75)):
        with Locations((68.4, -38)):
            Rectangle(SKETCH018_W, SKETCH018_H)
    extrude(amount=-POCKET015_DEPTH, mode=Mode.SUBTRACT)

    # Sketch019 (on Face4 of Pocket015) → Pocket016 (cut)
    with BuildSketch(Plane(origin=(0, 0, 0), x_dir=(1, 0, 0), z_dir=(0, 0, -1))):
        with BuildLine():
            ThreePointArc((88, -25), (86.5, -23.5), (85, -25))
            Line((85, -25), (85, -45))
            ThreePointArc((85, -45), (86.5, -46.5), (88, -45))
            Line((88, -45), (88, -25))
        make_face()
    extrude(amount=-POCKET016_DEPTH, mode=Mode.SUBTRACT)

    # Chamfer
    chamfer_edges = [part.edges().sort_by_distance(p)[0] for p in [
        (88.4, 29.5, 5),
        (119.7, 55, 5),
        (151, 49, 5),
        (151, 29.5, 5),
        (144.75, 16, 5),
        (137.5, 15, 5),
        (119.7, 14, 5),
        (101.9, 15, 5),
        (94.65, 16, 5),
    ]]
    chamfer(chamfer_edges, length=CHAMFER_SIZE)

    # Chamfer001
    chamfer001_edges = [part.edges().sort_by_distance(p)[0] for p in [
        (30.046074, 59.96648, 5),
    ]]
    chamfer(chamfer001_edges, length=CHAMFER001_SIZE)


solid = part.part
